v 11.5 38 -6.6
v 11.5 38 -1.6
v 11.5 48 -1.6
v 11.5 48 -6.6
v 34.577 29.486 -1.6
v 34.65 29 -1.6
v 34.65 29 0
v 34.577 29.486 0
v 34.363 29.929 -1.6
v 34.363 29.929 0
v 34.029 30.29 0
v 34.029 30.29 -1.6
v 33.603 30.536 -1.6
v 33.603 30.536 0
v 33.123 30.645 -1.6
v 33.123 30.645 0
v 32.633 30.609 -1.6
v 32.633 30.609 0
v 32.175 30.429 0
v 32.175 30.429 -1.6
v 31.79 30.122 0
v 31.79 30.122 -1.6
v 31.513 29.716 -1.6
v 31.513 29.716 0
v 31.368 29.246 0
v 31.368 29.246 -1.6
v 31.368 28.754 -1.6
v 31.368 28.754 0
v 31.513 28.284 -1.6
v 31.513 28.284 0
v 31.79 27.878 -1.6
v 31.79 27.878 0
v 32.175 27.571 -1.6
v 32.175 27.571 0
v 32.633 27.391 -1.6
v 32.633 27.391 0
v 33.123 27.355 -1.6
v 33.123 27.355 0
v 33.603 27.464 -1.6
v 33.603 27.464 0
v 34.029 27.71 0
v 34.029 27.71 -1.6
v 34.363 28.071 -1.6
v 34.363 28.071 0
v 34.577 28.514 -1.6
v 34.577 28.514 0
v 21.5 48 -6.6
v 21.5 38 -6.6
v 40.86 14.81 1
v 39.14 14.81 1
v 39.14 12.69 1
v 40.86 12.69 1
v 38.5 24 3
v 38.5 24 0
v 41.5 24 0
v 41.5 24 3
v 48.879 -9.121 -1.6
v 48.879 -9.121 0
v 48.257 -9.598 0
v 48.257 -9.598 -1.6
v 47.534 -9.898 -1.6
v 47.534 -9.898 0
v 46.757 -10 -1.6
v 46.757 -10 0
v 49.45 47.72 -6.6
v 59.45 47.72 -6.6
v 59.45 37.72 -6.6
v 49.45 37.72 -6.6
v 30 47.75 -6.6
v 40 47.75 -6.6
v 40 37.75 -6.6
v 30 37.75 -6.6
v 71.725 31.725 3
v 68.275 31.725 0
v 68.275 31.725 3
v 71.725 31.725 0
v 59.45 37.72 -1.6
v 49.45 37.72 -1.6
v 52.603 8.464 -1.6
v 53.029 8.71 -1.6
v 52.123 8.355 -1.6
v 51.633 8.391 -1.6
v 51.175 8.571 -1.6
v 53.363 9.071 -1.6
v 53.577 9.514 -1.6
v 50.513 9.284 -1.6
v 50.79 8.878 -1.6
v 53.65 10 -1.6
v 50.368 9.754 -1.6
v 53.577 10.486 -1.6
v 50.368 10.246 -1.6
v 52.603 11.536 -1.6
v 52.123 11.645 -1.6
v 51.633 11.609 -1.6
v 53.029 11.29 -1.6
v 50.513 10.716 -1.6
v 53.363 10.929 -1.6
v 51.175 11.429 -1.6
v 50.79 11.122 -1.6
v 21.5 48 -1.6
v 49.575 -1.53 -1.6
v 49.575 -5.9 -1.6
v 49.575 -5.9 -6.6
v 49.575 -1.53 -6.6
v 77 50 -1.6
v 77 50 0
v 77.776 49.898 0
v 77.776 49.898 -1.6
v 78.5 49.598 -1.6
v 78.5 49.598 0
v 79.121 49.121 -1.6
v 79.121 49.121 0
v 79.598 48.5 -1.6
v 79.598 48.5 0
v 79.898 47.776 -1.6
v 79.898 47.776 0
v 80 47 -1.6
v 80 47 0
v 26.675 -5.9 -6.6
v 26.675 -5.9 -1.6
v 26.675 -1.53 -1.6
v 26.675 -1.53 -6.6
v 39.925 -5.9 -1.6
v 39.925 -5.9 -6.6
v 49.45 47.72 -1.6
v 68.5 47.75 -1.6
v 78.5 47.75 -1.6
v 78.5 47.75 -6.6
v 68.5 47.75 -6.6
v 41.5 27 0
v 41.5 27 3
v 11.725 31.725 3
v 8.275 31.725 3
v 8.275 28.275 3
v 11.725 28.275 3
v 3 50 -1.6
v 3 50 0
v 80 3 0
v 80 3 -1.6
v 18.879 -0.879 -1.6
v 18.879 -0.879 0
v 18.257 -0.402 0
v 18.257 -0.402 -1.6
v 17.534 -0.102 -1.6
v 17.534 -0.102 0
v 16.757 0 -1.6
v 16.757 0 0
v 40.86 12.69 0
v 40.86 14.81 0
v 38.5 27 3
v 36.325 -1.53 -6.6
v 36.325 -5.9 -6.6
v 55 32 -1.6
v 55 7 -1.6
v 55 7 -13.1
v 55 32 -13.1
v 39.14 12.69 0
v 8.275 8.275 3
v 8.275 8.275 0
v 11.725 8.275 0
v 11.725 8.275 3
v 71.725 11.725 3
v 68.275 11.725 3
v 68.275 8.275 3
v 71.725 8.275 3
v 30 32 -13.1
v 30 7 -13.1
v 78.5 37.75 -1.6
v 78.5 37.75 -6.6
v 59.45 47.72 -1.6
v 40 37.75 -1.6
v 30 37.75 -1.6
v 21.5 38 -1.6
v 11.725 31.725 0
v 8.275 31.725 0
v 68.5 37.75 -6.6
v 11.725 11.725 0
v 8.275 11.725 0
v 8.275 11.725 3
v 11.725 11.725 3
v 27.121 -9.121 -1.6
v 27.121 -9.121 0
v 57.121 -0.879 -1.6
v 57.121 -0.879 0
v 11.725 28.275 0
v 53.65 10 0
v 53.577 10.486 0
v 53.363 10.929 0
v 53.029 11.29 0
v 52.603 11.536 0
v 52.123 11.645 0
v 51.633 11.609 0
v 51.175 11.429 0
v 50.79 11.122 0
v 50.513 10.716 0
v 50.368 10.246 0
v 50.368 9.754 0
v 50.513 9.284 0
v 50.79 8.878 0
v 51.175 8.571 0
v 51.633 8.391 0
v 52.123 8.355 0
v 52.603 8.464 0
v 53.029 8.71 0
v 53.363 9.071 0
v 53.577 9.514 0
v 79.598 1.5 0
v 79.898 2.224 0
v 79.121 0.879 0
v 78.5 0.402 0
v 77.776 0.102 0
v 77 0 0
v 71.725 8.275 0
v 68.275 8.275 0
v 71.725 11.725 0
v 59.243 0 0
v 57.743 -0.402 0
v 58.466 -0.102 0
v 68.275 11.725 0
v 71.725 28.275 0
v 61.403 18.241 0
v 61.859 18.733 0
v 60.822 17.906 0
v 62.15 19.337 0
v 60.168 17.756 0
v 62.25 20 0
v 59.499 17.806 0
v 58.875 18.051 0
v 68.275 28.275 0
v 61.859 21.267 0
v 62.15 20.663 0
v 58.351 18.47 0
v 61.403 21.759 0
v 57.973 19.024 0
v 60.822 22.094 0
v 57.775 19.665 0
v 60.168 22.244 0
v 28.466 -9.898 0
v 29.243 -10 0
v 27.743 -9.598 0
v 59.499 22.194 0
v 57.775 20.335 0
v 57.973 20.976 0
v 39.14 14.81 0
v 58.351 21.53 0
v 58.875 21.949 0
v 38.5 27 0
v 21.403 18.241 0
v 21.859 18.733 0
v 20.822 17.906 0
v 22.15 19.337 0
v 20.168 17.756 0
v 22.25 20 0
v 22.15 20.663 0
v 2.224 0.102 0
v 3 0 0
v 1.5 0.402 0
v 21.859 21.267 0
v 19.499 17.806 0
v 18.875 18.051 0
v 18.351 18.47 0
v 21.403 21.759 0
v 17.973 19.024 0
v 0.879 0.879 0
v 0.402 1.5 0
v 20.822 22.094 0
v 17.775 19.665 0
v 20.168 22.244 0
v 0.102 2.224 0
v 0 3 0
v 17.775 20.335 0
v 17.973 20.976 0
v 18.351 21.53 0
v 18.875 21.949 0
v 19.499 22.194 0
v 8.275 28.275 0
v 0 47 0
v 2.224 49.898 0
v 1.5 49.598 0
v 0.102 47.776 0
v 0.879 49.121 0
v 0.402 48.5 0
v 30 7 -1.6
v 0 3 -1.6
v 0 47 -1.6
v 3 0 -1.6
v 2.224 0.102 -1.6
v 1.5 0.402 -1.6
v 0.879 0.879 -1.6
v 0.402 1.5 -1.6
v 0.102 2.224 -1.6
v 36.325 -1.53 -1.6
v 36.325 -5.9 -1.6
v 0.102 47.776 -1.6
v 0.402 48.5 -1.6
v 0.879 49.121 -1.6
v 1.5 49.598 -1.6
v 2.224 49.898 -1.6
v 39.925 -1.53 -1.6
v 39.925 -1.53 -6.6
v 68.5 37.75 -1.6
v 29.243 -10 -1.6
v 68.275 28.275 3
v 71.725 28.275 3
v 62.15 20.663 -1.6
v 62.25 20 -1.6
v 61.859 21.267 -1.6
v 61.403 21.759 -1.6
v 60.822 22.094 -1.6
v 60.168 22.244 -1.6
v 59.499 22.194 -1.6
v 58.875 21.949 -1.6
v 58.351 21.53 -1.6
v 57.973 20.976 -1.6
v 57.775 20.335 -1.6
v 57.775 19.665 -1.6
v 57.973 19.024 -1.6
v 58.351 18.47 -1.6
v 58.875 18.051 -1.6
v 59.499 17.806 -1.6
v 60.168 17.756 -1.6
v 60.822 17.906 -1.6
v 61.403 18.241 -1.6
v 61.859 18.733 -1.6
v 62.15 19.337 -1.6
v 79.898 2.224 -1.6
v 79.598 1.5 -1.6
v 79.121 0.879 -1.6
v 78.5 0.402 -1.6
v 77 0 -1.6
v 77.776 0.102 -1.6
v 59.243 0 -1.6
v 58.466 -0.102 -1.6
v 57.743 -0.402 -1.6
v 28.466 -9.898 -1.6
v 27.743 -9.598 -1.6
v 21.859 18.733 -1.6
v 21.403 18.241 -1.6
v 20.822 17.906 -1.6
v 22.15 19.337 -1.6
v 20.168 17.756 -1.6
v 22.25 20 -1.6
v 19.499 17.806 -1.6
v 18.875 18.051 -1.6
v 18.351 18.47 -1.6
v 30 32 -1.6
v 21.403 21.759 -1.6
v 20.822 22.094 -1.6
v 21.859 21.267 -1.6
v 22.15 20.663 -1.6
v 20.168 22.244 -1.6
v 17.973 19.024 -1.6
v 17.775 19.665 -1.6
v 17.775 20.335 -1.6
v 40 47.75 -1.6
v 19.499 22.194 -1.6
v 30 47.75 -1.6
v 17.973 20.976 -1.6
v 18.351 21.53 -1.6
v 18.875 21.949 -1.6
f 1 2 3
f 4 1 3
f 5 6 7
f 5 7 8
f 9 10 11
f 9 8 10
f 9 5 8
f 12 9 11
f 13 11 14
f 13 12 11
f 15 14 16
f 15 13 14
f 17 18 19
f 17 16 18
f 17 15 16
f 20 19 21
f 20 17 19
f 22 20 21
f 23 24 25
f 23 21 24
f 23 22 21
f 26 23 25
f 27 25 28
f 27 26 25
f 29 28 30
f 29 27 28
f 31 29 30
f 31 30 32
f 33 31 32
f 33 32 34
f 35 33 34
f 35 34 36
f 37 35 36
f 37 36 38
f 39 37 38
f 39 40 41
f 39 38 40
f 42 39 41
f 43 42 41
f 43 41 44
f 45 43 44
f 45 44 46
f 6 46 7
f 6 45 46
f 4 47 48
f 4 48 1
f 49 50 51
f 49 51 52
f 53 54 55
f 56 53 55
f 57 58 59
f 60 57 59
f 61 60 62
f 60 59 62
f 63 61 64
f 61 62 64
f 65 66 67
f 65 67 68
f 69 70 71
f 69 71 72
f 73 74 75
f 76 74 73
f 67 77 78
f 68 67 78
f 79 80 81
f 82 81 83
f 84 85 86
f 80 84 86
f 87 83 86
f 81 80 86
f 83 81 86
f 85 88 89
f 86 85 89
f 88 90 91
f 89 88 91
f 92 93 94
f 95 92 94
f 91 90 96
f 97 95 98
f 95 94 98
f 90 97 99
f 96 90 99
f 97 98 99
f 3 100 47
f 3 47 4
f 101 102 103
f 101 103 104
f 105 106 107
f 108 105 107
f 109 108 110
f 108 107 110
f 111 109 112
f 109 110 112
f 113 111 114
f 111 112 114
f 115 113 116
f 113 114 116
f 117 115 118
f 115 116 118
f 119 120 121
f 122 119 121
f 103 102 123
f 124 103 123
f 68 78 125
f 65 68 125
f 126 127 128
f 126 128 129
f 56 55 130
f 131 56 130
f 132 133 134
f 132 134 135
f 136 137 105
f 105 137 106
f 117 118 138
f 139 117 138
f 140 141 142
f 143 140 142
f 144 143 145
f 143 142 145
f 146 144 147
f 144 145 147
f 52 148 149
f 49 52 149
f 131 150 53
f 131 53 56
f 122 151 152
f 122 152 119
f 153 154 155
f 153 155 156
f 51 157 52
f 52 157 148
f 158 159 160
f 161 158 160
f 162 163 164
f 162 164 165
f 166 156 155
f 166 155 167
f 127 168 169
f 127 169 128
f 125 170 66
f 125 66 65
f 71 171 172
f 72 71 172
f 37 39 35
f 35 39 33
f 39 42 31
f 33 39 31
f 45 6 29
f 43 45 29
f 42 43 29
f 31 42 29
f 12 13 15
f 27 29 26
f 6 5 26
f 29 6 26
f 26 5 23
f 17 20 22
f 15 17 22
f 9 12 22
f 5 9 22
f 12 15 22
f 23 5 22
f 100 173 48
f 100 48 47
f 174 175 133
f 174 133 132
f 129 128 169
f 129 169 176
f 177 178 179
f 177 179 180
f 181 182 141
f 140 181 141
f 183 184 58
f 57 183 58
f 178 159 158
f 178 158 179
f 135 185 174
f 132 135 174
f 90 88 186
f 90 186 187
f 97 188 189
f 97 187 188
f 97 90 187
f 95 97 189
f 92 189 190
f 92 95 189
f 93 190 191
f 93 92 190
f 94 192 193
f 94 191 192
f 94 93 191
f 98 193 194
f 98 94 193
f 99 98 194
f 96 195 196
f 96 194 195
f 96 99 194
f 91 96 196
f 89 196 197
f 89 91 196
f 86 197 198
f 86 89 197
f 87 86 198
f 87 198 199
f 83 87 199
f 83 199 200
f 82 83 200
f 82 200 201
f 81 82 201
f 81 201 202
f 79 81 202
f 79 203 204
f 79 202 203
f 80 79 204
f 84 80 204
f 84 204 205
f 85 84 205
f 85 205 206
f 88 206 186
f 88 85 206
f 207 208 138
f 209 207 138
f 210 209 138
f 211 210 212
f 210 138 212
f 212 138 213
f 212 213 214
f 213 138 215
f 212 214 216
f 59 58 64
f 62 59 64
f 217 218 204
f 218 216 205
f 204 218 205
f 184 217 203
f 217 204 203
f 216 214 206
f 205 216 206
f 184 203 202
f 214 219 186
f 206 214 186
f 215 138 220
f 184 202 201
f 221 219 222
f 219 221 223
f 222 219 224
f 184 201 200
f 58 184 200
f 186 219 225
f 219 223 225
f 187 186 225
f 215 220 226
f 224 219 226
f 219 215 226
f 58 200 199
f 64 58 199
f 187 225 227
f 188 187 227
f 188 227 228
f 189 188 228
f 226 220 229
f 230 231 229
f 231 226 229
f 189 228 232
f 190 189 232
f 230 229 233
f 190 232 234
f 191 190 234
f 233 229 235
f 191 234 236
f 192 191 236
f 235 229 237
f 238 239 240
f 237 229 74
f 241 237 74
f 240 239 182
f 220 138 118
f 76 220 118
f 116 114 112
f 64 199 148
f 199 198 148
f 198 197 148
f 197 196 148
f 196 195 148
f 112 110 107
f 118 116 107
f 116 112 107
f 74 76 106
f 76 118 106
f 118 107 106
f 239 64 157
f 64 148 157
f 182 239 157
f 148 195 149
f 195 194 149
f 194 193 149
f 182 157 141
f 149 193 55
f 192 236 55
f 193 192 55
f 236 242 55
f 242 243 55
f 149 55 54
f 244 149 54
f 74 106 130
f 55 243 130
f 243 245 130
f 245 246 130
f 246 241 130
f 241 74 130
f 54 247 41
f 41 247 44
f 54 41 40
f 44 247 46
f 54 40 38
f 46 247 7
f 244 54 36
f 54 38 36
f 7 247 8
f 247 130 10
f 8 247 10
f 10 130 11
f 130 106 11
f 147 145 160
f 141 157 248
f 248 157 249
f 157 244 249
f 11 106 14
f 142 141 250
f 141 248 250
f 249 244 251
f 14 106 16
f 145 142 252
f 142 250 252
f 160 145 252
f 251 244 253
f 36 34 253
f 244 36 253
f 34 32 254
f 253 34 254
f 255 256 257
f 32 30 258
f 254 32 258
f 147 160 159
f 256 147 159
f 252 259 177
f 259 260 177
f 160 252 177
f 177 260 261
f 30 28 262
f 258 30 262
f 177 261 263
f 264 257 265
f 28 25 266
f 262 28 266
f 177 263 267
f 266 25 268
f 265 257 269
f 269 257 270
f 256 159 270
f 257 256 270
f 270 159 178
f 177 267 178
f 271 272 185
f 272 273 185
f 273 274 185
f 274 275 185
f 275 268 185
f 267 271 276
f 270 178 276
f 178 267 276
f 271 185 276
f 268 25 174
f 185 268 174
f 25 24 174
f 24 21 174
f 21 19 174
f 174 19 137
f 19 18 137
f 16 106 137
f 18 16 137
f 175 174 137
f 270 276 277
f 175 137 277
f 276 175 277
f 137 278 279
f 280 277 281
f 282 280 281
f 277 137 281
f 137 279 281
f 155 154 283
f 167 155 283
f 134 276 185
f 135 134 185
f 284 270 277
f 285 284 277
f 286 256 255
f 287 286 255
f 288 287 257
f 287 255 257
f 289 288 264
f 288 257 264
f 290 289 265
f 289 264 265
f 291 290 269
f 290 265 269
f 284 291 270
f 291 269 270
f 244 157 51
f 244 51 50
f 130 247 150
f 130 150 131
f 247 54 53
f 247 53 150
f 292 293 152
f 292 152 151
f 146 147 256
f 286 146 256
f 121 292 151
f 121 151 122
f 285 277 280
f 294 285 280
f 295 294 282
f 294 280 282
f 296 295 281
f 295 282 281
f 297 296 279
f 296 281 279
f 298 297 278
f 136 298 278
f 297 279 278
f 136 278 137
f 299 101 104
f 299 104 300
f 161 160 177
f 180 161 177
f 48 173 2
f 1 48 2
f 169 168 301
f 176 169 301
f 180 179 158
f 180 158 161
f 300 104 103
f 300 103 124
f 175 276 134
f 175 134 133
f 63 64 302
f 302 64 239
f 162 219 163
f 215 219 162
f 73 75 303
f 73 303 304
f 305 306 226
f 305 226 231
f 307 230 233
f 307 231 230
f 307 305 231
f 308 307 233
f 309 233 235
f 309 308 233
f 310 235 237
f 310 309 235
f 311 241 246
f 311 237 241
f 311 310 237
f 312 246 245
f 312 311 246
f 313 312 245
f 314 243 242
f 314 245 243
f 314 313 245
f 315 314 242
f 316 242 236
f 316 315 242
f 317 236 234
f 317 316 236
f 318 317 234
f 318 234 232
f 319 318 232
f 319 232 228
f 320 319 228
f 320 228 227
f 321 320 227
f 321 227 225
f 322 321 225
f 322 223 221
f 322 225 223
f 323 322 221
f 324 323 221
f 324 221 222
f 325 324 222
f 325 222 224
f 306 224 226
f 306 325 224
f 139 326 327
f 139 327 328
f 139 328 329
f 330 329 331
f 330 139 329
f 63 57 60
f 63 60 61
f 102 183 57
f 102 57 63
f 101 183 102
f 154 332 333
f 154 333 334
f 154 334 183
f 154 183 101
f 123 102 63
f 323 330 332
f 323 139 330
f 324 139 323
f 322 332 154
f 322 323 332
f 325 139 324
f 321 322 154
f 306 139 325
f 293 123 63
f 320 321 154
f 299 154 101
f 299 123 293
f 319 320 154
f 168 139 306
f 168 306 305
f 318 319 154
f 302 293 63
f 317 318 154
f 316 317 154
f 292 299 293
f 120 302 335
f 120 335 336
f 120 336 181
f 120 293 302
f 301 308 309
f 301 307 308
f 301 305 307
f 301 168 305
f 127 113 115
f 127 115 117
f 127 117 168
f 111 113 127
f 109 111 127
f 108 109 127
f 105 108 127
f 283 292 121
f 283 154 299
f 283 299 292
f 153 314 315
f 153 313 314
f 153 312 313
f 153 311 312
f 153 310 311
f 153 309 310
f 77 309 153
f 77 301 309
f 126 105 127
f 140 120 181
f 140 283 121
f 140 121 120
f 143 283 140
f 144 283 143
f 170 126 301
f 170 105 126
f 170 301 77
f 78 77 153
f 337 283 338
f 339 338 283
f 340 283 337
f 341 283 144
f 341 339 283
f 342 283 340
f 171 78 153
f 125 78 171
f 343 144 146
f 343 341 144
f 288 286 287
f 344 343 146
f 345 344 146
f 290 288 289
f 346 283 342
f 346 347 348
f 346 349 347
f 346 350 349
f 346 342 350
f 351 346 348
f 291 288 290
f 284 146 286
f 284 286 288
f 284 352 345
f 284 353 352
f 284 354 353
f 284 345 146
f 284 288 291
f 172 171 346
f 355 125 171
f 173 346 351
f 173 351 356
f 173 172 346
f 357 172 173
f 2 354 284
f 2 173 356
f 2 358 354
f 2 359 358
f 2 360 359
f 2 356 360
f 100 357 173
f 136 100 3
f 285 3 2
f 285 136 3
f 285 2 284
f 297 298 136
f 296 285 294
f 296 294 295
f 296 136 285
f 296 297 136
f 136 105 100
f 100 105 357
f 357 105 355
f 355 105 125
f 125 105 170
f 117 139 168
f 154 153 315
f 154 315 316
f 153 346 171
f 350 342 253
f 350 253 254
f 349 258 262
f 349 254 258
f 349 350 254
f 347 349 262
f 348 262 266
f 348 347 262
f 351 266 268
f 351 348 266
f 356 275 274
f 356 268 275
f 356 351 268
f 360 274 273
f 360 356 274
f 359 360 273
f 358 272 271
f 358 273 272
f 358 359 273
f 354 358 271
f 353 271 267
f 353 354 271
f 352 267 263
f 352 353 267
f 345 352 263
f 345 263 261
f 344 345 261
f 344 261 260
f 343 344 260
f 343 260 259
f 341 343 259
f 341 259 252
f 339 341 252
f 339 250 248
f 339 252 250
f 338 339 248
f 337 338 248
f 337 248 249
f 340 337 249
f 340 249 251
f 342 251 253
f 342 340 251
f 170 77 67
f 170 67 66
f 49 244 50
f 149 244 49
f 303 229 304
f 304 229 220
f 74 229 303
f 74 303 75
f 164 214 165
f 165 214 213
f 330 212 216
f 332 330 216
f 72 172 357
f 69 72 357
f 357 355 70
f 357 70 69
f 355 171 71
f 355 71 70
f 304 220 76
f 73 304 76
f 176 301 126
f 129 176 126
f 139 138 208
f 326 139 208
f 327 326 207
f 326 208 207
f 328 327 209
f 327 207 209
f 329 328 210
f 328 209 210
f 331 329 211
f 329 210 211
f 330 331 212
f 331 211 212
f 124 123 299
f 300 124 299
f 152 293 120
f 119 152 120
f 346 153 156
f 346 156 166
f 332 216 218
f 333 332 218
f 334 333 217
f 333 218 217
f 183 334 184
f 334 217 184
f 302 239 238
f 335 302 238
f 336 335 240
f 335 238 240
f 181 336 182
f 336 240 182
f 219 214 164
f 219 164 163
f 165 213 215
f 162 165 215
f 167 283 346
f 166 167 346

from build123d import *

# Parameters (mm, degrees)
BOSS_EXTRU_1_DEPTH           = 1.6
ESQUISSE3_W                  = 3.45
ESQUISSE3_H                  = 3.45
BOSS_EXTRU_2_DEPTH           = 3
ESQUISSE4_W                  = 3.45
ESQUISSE4_H                  = 3.45
BOSS_EXTRU_3_DEPTH           = 3
ESQUISSE5_W                  = 3
ESQUISSE5_H                  = 3
BOSS_EXTRU_4_DEPTH           = 3
ESQUISSE6_W                  = 1.72
ESQUISSE6_H                  = 2.12
BOSS_EXTRU_5_DEPTH           = 1
ENL_V_MAT_EXTRU_1_DEPTH      = 95.387499172
ENL_V_MAT_EXTRU_1_DEPTH_BACK = 95.387499172
ESQUISSE7_R                  = 2.25
ESQUISSE7_R_2                = 1.65
ESQUISSE8_W                  = 25
ESQUISSE8_H                  = 25
BOSS_EXTRU_6_DEPTH           = 11.5
ESQUISSE9_W                  = 10
ESQUISSE9_H                  = 10
BOSS_EXTRU_7_DEPTH           = 5
ESQUISSE10_W                 = 9.65005
ESQUISSE10_H                 = 4.37005
ESQUISSE10_W_2               = 9.65
BOSS_EXTRU_8_DEPTH           = 5


with BuildPart() as part:
    # Esquisse2 → Boss.-Extru.1 (new body)
    with BuildSketch(Plane.XY):
        with BuildLine():
            Line((0, 3), (0, 47))
            ThreePointArc((0, 47), (0.878679656, 49.121320344), (3, 50))
            Line((3, 50), (77, 50))
            ThreePointArc((77, 50), (79.121320344, 49.121320344), (80, 47))
            Line((80, 47), (80, 3))
            ThreePointArc((80, 3), (79.121320344, 0.878679656), (77, 0))
            Line((77, 0), (59.2426, 0))
            ThreePointArc((59.2426, 0), (58.094558305, -0.228374693), (57.1213, -0.8787))
            Line((57.1213, -0.8787), (48.8787, -9.1213))
            ThreePointArc((48.8787, -9.1213), (47.905441695, -9.771625307), (46.7574, -10))
            Line((46.7574, -10), (29.2426, -10))
            ThreePointArc((29.2426, -10), (28.094558305, -9.771625307), (27.1213, -9.1213))
            Line((27.1213, -9.1213), (18.8787, -0.8787))
            ThreePointArc((18.8787, -0.8787), (17.905441695, -0.228374693), (16.7574, 0))
            Line((16.7574, 0), (3, 0))
            ThreePointArc((3, 0), (0.878679656, 0.878679656), (0, 3))
        make_face()
    extrude(amount=-BOSS_EXTRU_1_DEPTH)

    # Esquisse3 → Boss.-Extru.2 (add)
    with BuildSketch(Plane.XY):
        with Locations((10, 10)):
            Rectangle(ESQUISSE3_W, ESQUISSE3_H)
        with Locations((10, 30)):
            Rectangle(ESQUISSE3_W, ESQUISSE3_H)
    extrude(amount=BOSS_EXTRU_2_DEPTH)

    # Esquisse4 → Boss.-Extru.3 (add)
    with BuildSketch(Plane.XY):
        with Locations((70, 10)):
            Rectangle(ESQUISSE4_W, ESQUISSE4_H)
        with Locations((70, 30)):
            Rectangle(ESQUISSE4_W, ESQUISSE4_H)
    extrude(amount=BOSS_EXTRU_3_DEPTH)

    # Esquisse5 → Boss.-Extru.4 (add)
    with BuildSketch(Plane.XY):
        with Locations((40, 25.5)):
            Rectangle(ESQUISSE5_W, ESQUISSE5_H)
    extrude(amount=BOSS_EXTRU_4_DEPTH)

    # Esquisse6 → Boss.-Extru.5 (add)
    with BuildSketch(Plane.XY):
        with Locations((40, 13.75)):
            Rectangle(ESQUISSE6_W, ESQUISSE6_H)
    extrude(amount=BOSS_EXTRU_5_DEPTH)

    # Esquisse7 → Enlèv. mat.-Extru.1 (cut, two sides: drawn at the far end of the back side and taken through both)
    with BuildSketch(Plane.XY.offset(-ENL_V_MAT_EXTRU_1_DEPTH_BACK)):
        with Locations((20, 20)):
            Circle(ESQUISSE7_R)
        with Locations((60, 20)):
            Circle(ESQUISSE7_R)
        with Locations((33, 29)):
            Circle(ESQUISSE7_R_2)
        with Locations((52, 10)):
            Circle(ESQUISSE7_R_2)
    extrude(amount=ENL_V_MAT_EXTRU_1_DEPTH + ENL_V_MAT_EXTRU_1_DEPTH_BACK, mode=Mode.SUBTRACT)

    # Esquisse8 → Boss.-Extru.6 (add)
    with BuildSketch(Plane(origin=(0, 0, -1.6), x_dir=(-1, 0, 0), z_dir=(0, 0, -1))):
        with Locations((-42.5, 19.5)):
            Rectangle(ESQUISSE8_W, ESQUISSE8_H)
    extrude(amount=BOSS_EXTRU_6_DEPTH)

    # Esquisse9 → Boss.-Extru.7 (add)
    with BuildSketch(Plane(origin=(0, 0, -1.6), x_dir=(-1, 0, 0), z_dir=(0, 0, -1))):
        with Locations((-16.5, 43)):
            Rectangle(ESQUISSE9_W, ESQUISSE9_H)
        with Locations((-35, 42.75)):
            Rectangle(ESQUISSE9_W, ESQUISSE9_H)
        with Locations((-54.45, 42.72)):
            Rectangle(ESQUISSE9_W, ESQUISSE9_H)
        with Locations((-73.5, 42.75)):
            Rectangle(ESQUISSE9_W, ESQUISSE9_H)
    extrude(amount=BOSS_EXTRU_7_DEPTH)

    # Esquisse10 → Boss.-Extru.8 (add)
    with BuildSketch(Plane(origin=(0, 0, -1.6), x_dir=(-1, 0, 0), z_dir=(0, 0, -1))):
        with Locations((-31.500025, -3.715025)):
            Rectangle(ESQUISSE10_W, ESQUISSE10_H)
        with Locations((-44.75, -3.715025)):
            Rectangle(ESQUISSE10_W_2, ESQUISSE10_H)
    extrude(amount=BOSS_EXTRU_8_DEPTH)


solid = part.part
